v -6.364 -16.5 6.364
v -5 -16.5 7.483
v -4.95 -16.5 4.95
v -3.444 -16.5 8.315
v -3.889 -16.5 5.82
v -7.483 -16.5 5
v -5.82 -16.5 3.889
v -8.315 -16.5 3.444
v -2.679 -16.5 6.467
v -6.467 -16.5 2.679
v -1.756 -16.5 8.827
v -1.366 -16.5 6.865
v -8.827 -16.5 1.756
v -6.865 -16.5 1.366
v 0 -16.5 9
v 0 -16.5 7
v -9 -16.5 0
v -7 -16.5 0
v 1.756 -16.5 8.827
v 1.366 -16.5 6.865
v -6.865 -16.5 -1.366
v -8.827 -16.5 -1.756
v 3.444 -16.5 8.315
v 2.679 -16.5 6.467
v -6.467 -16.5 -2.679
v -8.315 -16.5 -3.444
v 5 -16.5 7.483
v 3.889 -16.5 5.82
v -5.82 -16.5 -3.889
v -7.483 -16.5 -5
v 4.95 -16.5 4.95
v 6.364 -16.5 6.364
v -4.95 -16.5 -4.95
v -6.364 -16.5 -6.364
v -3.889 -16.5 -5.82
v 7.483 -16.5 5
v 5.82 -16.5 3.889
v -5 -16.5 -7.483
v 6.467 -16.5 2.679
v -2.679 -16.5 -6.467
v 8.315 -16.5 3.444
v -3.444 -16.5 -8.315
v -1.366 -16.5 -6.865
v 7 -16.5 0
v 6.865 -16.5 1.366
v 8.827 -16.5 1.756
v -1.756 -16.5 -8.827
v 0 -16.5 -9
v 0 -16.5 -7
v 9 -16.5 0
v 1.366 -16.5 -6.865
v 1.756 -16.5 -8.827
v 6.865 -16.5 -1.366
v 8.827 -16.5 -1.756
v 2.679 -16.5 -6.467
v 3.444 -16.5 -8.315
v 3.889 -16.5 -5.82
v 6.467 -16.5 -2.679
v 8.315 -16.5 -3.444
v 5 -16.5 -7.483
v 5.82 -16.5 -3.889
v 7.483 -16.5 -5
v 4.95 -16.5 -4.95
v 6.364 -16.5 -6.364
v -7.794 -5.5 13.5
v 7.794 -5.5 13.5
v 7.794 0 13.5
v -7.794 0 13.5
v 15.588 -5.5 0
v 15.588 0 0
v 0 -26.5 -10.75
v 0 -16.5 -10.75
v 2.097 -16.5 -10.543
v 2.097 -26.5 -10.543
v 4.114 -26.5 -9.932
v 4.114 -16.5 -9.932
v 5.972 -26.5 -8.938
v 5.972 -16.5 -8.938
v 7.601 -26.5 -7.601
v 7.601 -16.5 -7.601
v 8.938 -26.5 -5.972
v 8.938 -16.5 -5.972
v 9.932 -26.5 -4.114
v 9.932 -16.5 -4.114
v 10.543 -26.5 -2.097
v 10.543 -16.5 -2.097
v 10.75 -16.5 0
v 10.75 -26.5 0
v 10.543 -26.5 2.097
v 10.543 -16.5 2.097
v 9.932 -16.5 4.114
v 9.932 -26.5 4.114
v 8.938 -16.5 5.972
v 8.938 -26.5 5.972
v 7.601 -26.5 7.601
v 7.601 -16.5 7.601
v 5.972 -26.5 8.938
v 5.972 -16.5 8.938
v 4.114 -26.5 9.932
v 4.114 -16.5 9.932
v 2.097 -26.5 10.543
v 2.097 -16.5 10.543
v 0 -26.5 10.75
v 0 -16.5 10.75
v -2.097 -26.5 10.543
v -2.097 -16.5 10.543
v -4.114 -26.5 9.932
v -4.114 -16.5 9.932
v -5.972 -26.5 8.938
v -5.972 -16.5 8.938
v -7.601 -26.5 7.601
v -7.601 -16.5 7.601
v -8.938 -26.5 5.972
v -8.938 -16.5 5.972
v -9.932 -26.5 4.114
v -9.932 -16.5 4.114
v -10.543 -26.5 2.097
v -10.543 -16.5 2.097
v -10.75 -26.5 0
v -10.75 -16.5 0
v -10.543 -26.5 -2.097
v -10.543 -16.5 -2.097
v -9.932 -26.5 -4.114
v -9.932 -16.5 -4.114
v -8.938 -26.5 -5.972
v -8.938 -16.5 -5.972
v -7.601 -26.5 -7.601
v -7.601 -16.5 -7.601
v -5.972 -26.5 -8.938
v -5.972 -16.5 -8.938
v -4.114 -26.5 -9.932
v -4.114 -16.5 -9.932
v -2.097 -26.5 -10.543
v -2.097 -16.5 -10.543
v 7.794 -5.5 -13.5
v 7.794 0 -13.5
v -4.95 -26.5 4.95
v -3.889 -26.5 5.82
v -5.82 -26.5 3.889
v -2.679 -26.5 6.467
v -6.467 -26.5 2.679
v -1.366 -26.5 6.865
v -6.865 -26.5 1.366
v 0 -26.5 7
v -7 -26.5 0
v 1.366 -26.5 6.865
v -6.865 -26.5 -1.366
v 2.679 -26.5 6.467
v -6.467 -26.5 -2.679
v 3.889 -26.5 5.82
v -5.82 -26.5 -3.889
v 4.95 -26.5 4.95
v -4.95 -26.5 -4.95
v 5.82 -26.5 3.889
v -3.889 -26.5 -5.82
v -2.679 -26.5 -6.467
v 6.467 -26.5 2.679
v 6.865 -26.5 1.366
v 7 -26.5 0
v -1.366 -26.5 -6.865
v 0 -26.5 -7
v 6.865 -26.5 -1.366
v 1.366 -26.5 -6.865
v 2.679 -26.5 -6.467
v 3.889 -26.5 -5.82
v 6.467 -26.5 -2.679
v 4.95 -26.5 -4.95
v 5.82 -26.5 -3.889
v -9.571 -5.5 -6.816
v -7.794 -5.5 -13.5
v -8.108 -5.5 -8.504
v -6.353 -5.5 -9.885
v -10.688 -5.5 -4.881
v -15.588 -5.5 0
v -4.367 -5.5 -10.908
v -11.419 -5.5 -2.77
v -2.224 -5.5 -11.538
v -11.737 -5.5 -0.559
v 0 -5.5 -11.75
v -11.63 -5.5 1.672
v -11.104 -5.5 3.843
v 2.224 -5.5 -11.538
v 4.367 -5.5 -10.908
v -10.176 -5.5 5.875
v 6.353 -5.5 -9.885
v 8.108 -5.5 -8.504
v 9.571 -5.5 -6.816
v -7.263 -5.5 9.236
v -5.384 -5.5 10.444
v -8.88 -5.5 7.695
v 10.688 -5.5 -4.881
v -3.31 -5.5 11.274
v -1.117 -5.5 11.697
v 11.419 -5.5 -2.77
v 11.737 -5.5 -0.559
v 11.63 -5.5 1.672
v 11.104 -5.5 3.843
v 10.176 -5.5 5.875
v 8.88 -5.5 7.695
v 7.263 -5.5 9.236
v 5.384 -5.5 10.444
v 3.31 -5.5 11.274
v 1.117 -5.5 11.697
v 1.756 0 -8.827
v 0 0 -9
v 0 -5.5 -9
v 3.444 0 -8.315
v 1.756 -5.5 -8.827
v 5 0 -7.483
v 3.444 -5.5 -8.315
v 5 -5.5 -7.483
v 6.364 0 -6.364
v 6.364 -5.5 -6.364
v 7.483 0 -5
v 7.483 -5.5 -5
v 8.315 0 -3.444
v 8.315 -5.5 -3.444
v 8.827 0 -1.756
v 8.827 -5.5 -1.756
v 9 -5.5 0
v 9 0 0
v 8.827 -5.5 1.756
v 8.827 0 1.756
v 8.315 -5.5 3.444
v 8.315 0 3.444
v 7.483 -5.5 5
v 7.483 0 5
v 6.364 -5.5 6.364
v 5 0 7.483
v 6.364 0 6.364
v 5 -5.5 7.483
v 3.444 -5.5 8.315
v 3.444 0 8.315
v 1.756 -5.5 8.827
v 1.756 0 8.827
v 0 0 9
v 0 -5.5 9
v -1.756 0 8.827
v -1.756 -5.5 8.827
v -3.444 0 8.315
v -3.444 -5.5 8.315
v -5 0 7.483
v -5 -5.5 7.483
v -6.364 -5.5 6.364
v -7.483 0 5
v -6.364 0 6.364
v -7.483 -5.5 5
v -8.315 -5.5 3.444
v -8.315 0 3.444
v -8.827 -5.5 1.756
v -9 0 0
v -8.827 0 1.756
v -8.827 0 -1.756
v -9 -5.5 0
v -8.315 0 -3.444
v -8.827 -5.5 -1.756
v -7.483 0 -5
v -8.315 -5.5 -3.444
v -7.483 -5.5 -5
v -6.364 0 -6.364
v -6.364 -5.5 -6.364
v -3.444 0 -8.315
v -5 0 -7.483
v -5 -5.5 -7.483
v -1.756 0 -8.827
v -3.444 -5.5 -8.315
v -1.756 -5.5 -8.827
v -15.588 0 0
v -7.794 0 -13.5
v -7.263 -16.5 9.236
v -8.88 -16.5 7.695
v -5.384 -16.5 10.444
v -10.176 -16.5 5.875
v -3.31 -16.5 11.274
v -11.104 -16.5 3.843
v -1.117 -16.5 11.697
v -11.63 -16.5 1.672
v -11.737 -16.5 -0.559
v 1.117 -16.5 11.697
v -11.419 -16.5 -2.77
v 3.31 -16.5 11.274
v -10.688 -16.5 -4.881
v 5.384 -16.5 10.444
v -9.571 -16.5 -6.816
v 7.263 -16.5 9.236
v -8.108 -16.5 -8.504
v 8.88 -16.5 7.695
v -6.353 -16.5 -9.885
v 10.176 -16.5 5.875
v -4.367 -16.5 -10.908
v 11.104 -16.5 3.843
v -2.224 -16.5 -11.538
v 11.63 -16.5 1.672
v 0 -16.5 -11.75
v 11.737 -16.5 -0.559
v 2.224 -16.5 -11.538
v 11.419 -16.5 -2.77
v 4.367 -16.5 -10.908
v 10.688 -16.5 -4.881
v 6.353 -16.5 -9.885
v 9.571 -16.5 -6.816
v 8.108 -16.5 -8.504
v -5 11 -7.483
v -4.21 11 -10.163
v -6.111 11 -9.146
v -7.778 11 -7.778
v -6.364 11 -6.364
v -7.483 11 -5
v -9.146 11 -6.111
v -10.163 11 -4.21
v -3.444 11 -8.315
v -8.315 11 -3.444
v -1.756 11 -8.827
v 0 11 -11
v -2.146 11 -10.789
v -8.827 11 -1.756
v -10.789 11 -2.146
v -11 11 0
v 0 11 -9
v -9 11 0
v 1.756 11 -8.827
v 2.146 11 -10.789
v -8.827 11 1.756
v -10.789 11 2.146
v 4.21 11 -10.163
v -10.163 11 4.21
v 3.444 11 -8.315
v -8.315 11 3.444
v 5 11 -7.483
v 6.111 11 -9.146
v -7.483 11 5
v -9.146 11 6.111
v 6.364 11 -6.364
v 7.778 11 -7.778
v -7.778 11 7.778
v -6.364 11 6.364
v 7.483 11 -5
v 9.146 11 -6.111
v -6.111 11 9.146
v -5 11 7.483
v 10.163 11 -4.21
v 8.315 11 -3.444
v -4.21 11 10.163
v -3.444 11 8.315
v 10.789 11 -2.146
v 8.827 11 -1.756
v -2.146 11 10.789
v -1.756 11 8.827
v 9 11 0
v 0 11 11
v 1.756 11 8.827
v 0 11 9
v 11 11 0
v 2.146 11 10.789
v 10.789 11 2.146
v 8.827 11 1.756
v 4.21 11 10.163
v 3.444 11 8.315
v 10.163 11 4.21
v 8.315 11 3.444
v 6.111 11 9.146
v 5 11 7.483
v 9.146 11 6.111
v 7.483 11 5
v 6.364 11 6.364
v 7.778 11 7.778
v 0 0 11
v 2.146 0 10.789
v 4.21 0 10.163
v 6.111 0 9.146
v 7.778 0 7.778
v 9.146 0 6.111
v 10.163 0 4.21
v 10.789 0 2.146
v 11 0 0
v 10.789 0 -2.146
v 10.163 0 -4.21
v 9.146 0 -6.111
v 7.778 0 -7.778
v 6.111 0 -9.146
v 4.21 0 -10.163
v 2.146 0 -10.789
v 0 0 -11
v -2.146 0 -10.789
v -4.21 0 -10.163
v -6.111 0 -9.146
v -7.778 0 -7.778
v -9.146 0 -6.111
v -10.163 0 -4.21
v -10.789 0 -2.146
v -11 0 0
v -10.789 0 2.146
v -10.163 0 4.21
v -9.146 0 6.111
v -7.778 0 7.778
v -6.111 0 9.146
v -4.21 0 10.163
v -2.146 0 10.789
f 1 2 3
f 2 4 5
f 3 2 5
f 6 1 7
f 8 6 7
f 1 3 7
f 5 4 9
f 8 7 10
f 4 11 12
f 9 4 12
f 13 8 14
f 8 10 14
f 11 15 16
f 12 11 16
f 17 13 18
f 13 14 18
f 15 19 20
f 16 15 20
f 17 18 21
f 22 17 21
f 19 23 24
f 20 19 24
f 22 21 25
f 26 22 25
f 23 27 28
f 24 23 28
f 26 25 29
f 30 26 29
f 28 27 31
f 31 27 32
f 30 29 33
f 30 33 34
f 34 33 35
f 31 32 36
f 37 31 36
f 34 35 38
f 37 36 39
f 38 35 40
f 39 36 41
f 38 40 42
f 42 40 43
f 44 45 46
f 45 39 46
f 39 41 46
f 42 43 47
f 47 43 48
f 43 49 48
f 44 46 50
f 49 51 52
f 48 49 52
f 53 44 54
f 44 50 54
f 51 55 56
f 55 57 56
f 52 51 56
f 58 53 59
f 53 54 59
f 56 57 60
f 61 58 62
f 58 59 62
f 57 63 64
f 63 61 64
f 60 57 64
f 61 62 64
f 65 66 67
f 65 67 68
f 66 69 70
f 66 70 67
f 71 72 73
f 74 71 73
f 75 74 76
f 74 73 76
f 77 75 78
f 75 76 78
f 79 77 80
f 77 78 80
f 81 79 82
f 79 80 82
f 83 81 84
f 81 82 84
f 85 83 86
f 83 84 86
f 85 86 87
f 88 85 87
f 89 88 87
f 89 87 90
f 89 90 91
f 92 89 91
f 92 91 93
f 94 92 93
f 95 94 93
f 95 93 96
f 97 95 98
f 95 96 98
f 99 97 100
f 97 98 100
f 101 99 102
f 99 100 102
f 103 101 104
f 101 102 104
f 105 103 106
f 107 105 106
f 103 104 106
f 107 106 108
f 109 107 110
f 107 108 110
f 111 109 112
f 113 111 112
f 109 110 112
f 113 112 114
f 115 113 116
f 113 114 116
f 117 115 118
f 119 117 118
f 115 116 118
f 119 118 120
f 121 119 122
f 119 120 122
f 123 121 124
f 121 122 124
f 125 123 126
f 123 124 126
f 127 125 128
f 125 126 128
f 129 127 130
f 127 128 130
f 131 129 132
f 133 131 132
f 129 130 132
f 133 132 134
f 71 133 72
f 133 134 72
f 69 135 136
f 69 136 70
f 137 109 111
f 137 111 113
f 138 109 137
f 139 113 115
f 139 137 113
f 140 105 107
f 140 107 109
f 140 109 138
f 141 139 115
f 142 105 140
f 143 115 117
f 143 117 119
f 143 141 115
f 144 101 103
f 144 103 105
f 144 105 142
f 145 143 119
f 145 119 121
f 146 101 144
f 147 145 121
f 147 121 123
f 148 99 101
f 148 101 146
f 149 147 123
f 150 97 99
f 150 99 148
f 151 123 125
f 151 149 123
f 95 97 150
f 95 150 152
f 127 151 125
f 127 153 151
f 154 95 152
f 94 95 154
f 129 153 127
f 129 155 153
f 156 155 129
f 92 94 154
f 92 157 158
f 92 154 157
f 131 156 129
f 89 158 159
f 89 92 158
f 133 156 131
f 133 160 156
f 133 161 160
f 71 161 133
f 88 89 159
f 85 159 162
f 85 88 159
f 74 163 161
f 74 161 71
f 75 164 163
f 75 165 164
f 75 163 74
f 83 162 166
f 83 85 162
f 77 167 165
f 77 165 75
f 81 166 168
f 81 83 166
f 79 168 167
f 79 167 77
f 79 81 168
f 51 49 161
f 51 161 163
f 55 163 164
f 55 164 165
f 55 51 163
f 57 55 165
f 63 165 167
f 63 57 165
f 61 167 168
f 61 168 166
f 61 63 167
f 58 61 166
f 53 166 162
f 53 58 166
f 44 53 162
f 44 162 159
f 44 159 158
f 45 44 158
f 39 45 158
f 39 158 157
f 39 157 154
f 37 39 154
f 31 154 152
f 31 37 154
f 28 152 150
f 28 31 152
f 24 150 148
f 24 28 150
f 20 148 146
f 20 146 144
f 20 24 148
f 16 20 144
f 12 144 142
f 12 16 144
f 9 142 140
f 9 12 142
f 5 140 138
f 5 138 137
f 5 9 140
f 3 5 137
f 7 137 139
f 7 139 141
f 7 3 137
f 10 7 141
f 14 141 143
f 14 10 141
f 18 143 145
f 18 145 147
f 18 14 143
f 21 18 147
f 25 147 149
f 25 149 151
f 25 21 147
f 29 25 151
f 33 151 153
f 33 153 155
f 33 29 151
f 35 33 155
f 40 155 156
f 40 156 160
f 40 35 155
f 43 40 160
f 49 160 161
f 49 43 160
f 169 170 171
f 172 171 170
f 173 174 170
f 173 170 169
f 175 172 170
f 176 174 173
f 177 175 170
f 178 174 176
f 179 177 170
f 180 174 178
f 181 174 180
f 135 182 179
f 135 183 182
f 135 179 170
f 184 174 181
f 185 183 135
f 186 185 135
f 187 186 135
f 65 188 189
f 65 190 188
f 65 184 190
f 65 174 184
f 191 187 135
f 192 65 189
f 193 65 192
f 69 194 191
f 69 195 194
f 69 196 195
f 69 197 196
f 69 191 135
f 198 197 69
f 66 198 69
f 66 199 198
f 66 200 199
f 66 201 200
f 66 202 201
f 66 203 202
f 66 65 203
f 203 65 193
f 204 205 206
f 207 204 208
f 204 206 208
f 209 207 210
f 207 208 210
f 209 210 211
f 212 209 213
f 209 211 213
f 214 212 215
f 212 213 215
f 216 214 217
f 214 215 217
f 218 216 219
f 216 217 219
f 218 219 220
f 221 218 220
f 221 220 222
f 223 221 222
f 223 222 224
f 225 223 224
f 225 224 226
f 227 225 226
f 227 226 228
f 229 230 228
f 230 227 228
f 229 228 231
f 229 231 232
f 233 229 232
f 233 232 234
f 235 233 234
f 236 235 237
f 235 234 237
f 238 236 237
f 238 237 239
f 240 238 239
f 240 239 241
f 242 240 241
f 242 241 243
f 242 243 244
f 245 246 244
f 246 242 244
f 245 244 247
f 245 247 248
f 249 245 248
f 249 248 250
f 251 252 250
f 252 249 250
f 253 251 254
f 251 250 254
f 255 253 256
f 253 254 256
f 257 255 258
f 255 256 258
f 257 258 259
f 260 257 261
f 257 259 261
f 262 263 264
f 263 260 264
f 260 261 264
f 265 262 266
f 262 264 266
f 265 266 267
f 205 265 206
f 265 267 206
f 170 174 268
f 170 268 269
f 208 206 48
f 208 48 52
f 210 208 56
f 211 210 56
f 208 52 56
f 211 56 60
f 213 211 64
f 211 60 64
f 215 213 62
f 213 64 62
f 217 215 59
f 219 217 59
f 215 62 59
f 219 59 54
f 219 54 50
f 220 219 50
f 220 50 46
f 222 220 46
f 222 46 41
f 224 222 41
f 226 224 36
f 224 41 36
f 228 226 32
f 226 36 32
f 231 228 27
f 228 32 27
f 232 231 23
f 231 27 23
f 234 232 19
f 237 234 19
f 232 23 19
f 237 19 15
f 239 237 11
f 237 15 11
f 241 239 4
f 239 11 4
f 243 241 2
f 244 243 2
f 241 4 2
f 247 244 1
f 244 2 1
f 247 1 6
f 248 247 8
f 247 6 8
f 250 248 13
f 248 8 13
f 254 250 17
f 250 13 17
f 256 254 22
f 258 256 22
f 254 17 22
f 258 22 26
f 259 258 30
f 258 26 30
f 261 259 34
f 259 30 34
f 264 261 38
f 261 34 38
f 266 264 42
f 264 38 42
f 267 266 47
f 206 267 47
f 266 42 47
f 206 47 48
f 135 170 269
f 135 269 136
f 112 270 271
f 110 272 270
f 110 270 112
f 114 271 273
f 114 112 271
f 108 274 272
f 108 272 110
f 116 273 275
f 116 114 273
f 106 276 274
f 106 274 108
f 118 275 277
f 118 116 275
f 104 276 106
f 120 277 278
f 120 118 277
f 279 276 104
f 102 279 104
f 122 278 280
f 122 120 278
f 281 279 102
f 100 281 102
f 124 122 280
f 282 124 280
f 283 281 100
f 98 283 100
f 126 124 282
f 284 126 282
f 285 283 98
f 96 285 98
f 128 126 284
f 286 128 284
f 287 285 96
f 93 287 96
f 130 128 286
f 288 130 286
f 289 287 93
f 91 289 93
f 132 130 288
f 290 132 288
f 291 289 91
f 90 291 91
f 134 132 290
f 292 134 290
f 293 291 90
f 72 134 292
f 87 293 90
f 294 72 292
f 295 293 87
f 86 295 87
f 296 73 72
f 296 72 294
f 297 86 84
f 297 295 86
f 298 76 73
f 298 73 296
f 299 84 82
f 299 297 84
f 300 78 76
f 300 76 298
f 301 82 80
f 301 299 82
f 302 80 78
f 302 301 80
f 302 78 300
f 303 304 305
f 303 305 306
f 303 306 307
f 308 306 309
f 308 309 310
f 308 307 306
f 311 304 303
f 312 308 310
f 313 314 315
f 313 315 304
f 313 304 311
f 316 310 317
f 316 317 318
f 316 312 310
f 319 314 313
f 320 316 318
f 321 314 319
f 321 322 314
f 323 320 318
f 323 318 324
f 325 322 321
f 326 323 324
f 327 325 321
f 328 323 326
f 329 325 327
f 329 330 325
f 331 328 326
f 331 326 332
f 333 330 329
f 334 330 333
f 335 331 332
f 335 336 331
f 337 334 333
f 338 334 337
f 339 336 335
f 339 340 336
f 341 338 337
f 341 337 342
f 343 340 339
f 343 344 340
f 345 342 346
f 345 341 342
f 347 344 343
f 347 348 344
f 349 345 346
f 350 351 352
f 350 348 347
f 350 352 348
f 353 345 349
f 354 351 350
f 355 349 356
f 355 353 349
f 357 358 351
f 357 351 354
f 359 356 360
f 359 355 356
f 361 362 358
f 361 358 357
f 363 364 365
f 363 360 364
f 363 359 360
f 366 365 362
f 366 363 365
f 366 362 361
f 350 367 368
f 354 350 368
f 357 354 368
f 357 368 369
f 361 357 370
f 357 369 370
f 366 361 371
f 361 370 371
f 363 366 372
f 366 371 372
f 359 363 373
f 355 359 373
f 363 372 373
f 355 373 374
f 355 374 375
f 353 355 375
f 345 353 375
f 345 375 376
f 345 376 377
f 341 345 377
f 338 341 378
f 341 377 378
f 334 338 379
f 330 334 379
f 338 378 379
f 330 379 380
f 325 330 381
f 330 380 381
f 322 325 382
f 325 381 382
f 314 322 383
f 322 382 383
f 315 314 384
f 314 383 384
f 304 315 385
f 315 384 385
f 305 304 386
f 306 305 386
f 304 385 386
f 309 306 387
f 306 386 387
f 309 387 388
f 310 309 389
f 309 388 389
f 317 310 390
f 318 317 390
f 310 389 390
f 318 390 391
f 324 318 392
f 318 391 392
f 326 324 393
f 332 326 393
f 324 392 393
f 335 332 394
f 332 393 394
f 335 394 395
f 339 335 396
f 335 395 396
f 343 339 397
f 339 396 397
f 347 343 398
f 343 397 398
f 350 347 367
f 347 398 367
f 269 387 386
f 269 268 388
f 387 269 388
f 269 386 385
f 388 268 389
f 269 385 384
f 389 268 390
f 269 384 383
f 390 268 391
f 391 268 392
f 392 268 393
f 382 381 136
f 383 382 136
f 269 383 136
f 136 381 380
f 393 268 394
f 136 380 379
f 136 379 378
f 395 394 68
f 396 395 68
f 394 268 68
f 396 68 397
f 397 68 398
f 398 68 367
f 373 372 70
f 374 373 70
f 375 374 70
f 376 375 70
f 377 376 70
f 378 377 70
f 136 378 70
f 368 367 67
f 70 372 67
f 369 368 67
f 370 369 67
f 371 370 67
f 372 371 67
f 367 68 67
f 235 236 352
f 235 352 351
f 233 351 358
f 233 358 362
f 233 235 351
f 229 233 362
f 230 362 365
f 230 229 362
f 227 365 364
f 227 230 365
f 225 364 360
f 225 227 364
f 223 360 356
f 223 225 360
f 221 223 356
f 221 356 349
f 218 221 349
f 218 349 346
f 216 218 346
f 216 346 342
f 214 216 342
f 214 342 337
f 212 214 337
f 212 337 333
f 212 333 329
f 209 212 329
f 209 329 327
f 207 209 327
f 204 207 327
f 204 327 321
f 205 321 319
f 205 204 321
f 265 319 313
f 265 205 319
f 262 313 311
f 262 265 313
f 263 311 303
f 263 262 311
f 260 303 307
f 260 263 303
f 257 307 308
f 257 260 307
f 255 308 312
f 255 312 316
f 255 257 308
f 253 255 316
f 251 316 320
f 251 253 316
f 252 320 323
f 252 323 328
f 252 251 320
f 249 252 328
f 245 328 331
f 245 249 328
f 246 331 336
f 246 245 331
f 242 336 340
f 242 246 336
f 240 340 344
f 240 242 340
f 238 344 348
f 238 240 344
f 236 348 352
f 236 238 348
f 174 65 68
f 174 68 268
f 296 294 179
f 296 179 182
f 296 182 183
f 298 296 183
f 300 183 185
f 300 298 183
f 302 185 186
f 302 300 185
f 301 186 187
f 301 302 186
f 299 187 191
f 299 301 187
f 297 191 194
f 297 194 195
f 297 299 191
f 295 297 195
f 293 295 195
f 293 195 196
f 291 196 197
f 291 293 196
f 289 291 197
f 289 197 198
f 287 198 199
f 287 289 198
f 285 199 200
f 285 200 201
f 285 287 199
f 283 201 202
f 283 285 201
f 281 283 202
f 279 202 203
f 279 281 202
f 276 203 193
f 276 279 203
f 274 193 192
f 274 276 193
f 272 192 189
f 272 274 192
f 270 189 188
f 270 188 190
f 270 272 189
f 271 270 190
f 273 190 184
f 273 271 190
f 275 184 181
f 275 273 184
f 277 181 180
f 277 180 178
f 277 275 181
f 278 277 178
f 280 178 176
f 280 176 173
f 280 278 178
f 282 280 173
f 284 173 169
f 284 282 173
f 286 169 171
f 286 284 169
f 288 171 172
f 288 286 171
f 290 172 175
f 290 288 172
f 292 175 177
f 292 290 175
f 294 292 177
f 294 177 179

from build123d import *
from build123d.topology import SkipClean

# Parameters (mm, degrees)
SKIZZE1_R                       = 11
SKIZZE1_R_2                     = 9
AUFSATZ_LINEAR_AUSTRAGEN1_DEPTH = 11
AUFSATZ_LINEAR_START            = 5.5
SKIZZE2_R                       = 9
AUFSATZ_LINEAR_AUSTRAGEN2_DEPTH = 5.5
AUFSATZ_LINEAR_START_2          = 11
SKIZZE3_R                       = 11.75
SKIZZE3_R_2                     = 9
AUFSATZ_LINEAR_AUSTRAGEN3_DEPTH = 11
SKIZZE4_R                       = 10.75
SKIZZE4_R_2                     = 7
AUFSATZ_LINEAR_AUSTRAGEN4_DEPTH = 10


with BuildPart() as part:
    # Skizze1 → Aufsatz-Linear austragen1 (new body)
    with BuildSketch(Plane(origin=(0, 0, 0), x_dir=(1, 0, 0), z_dir=(0, 1, 0))):
        with Locations(Location((0, 0, 0), (0, 0, 270))):
            Circle(SKIZZE1_R)
        with Locations(Location((0, 0, 0), (0, 0, 270))):
            Circle(SKIZZE1_R_2, mode=Mode.SUBTRACT)
    extrude(amount=AUFSATZ_LINEAR_AUSTRAGEN1_DEPTH)

    # Skizze2 → Aufsatz-Linear austragen2 (add)
    with SkipClean():  # the faces are left unmerged after this step: merging them gives an invalid solid
        with BuildSketch(Plane.XZ.offset(AUFSATZ_LINEAR_START)):
            Polygon((15.588457268, 0), (7.794228634, 13.5), (-7.794228634, 13.5), (-15.588457268, 0), (-7.794228634, -13.5), (7.794228634, -13.5), align=None)
            with Locations(Location((0, 0, 0), (0, 0, 270))):
                Circle(SKIZZE2_R, mode=Mode.SUBTRACT)
        extrude(amount=-AUFSATZ_LINEAR_AUSTRAGEN2_DEPTH)

    # Skizze3 → Aufsatz-Linear austragen3 (add)
    with SkipClean():  # the faces are left unmerged after this step: merging them gives an invalid solid
        with BuildSketch(Plane.XZ.offset(5.5).offset(AUFSATZ_LINEAR_START_2)):
            with Locations(Location((0, 0, 0), (0, 0, 270))):
                Circle(SKIZZE3_R)
            with Locations(Location((0, 0, 0), (0, 0, 270))):
                Circle(SKIZZE3_R_2, mode=Mode.SUBTRACT)
        extrude(amount=-AUFSATZ_LINEAR_AUSTRAGEN3_DEPTH)

    # Skizze4 → Aufsatz-Linear austragen4 (add)
    with SkipClean():  # the faces are left unmerged after this step: merging them gives an invalid solid
        with BuildSketch(Plane.XZ.offset(16.5)):
            with Locations(Location((0, 0, 0), (0, 0, 270))):
                Circle(SKIZZE4_R)
            with Locations(Location((0, 0, 0), (0, 0, 270))):
                Circle(SKIZZE4_R_2, mode=Mode.SUBTRACT)
        extrude(amount=AUFSATZ_LINEAR_AUSTRAGEN4_DEPTH)


solid = part.part
